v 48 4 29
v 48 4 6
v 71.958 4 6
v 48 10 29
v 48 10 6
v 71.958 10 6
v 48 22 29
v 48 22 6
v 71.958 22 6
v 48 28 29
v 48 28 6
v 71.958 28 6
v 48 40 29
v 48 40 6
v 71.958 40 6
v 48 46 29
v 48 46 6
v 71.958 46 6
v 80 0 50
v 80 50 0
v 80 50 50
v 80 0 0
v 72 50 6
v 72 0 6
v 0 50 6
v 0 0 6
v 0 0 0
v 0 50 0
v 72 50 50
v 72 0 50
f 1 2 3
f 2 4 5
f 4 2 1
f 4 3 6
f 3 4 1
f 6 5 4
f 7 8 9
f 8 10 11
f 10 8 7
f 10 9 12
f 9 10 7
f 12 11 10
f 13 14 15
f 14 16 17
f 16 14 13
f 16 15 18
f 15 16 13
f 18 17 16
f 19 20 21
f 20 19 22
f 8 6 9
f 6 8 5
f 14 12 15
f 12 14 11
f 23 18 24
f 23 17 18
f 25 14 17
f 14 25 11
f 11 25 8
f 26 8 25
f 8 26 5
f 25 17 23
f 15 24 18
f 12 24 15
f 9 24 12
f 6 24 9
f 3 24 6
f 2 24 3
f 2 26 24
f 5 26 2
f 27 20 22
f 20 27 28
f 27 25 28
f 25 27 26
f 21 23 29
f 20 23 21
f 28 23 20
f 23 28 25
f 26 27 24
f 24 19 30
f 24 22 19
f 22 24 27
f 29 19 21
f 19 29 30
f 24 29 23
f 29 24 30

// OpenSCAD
$fn = 32;

// ----------------------------------------------------------------------
// Rib bracket: 3-gusset L bracket
// ----------------------------------------------------------------------

// --- parameters (mm) ---
base_l = 80;              // foot length, X
base_w = 50;              // foot width, Y
base_t = 6;               // foot thickness
plate_t = 8;              // upright plate thickness
plate_h = 50;             // overall height
gus_l = 24;               // gusset leg along the foot
gus_h = 24;               // gusset height
gus_t = 6;                // gusset thickness
gus_edge = 4;             // gusset margin from the foot edge
n_gus = 3;                // gusset count

gus_pitch = (base_w - 2 * gus_edge - gus_t) / (n_gus - 1);  // gusset pitch

union() {
  cube([base_l, base_w, base_t]);
  translate([base_l - plate_t, 0, base_t - 1])
    cube([plate_t, base_w, plate_h - base_t + 1]);
  for (i = [0 : n_gus - 1])
    translate([base_l - plate_t - gus_l, gus_edge + i * gus_pitch, base_t - 1])
      rotate([-90, 0, 0])
        linear_extrude(height = gus_t)
          polygon(points = [[0, 0], [gus_l + 1, 0], [0, -gus_h]]);
}
